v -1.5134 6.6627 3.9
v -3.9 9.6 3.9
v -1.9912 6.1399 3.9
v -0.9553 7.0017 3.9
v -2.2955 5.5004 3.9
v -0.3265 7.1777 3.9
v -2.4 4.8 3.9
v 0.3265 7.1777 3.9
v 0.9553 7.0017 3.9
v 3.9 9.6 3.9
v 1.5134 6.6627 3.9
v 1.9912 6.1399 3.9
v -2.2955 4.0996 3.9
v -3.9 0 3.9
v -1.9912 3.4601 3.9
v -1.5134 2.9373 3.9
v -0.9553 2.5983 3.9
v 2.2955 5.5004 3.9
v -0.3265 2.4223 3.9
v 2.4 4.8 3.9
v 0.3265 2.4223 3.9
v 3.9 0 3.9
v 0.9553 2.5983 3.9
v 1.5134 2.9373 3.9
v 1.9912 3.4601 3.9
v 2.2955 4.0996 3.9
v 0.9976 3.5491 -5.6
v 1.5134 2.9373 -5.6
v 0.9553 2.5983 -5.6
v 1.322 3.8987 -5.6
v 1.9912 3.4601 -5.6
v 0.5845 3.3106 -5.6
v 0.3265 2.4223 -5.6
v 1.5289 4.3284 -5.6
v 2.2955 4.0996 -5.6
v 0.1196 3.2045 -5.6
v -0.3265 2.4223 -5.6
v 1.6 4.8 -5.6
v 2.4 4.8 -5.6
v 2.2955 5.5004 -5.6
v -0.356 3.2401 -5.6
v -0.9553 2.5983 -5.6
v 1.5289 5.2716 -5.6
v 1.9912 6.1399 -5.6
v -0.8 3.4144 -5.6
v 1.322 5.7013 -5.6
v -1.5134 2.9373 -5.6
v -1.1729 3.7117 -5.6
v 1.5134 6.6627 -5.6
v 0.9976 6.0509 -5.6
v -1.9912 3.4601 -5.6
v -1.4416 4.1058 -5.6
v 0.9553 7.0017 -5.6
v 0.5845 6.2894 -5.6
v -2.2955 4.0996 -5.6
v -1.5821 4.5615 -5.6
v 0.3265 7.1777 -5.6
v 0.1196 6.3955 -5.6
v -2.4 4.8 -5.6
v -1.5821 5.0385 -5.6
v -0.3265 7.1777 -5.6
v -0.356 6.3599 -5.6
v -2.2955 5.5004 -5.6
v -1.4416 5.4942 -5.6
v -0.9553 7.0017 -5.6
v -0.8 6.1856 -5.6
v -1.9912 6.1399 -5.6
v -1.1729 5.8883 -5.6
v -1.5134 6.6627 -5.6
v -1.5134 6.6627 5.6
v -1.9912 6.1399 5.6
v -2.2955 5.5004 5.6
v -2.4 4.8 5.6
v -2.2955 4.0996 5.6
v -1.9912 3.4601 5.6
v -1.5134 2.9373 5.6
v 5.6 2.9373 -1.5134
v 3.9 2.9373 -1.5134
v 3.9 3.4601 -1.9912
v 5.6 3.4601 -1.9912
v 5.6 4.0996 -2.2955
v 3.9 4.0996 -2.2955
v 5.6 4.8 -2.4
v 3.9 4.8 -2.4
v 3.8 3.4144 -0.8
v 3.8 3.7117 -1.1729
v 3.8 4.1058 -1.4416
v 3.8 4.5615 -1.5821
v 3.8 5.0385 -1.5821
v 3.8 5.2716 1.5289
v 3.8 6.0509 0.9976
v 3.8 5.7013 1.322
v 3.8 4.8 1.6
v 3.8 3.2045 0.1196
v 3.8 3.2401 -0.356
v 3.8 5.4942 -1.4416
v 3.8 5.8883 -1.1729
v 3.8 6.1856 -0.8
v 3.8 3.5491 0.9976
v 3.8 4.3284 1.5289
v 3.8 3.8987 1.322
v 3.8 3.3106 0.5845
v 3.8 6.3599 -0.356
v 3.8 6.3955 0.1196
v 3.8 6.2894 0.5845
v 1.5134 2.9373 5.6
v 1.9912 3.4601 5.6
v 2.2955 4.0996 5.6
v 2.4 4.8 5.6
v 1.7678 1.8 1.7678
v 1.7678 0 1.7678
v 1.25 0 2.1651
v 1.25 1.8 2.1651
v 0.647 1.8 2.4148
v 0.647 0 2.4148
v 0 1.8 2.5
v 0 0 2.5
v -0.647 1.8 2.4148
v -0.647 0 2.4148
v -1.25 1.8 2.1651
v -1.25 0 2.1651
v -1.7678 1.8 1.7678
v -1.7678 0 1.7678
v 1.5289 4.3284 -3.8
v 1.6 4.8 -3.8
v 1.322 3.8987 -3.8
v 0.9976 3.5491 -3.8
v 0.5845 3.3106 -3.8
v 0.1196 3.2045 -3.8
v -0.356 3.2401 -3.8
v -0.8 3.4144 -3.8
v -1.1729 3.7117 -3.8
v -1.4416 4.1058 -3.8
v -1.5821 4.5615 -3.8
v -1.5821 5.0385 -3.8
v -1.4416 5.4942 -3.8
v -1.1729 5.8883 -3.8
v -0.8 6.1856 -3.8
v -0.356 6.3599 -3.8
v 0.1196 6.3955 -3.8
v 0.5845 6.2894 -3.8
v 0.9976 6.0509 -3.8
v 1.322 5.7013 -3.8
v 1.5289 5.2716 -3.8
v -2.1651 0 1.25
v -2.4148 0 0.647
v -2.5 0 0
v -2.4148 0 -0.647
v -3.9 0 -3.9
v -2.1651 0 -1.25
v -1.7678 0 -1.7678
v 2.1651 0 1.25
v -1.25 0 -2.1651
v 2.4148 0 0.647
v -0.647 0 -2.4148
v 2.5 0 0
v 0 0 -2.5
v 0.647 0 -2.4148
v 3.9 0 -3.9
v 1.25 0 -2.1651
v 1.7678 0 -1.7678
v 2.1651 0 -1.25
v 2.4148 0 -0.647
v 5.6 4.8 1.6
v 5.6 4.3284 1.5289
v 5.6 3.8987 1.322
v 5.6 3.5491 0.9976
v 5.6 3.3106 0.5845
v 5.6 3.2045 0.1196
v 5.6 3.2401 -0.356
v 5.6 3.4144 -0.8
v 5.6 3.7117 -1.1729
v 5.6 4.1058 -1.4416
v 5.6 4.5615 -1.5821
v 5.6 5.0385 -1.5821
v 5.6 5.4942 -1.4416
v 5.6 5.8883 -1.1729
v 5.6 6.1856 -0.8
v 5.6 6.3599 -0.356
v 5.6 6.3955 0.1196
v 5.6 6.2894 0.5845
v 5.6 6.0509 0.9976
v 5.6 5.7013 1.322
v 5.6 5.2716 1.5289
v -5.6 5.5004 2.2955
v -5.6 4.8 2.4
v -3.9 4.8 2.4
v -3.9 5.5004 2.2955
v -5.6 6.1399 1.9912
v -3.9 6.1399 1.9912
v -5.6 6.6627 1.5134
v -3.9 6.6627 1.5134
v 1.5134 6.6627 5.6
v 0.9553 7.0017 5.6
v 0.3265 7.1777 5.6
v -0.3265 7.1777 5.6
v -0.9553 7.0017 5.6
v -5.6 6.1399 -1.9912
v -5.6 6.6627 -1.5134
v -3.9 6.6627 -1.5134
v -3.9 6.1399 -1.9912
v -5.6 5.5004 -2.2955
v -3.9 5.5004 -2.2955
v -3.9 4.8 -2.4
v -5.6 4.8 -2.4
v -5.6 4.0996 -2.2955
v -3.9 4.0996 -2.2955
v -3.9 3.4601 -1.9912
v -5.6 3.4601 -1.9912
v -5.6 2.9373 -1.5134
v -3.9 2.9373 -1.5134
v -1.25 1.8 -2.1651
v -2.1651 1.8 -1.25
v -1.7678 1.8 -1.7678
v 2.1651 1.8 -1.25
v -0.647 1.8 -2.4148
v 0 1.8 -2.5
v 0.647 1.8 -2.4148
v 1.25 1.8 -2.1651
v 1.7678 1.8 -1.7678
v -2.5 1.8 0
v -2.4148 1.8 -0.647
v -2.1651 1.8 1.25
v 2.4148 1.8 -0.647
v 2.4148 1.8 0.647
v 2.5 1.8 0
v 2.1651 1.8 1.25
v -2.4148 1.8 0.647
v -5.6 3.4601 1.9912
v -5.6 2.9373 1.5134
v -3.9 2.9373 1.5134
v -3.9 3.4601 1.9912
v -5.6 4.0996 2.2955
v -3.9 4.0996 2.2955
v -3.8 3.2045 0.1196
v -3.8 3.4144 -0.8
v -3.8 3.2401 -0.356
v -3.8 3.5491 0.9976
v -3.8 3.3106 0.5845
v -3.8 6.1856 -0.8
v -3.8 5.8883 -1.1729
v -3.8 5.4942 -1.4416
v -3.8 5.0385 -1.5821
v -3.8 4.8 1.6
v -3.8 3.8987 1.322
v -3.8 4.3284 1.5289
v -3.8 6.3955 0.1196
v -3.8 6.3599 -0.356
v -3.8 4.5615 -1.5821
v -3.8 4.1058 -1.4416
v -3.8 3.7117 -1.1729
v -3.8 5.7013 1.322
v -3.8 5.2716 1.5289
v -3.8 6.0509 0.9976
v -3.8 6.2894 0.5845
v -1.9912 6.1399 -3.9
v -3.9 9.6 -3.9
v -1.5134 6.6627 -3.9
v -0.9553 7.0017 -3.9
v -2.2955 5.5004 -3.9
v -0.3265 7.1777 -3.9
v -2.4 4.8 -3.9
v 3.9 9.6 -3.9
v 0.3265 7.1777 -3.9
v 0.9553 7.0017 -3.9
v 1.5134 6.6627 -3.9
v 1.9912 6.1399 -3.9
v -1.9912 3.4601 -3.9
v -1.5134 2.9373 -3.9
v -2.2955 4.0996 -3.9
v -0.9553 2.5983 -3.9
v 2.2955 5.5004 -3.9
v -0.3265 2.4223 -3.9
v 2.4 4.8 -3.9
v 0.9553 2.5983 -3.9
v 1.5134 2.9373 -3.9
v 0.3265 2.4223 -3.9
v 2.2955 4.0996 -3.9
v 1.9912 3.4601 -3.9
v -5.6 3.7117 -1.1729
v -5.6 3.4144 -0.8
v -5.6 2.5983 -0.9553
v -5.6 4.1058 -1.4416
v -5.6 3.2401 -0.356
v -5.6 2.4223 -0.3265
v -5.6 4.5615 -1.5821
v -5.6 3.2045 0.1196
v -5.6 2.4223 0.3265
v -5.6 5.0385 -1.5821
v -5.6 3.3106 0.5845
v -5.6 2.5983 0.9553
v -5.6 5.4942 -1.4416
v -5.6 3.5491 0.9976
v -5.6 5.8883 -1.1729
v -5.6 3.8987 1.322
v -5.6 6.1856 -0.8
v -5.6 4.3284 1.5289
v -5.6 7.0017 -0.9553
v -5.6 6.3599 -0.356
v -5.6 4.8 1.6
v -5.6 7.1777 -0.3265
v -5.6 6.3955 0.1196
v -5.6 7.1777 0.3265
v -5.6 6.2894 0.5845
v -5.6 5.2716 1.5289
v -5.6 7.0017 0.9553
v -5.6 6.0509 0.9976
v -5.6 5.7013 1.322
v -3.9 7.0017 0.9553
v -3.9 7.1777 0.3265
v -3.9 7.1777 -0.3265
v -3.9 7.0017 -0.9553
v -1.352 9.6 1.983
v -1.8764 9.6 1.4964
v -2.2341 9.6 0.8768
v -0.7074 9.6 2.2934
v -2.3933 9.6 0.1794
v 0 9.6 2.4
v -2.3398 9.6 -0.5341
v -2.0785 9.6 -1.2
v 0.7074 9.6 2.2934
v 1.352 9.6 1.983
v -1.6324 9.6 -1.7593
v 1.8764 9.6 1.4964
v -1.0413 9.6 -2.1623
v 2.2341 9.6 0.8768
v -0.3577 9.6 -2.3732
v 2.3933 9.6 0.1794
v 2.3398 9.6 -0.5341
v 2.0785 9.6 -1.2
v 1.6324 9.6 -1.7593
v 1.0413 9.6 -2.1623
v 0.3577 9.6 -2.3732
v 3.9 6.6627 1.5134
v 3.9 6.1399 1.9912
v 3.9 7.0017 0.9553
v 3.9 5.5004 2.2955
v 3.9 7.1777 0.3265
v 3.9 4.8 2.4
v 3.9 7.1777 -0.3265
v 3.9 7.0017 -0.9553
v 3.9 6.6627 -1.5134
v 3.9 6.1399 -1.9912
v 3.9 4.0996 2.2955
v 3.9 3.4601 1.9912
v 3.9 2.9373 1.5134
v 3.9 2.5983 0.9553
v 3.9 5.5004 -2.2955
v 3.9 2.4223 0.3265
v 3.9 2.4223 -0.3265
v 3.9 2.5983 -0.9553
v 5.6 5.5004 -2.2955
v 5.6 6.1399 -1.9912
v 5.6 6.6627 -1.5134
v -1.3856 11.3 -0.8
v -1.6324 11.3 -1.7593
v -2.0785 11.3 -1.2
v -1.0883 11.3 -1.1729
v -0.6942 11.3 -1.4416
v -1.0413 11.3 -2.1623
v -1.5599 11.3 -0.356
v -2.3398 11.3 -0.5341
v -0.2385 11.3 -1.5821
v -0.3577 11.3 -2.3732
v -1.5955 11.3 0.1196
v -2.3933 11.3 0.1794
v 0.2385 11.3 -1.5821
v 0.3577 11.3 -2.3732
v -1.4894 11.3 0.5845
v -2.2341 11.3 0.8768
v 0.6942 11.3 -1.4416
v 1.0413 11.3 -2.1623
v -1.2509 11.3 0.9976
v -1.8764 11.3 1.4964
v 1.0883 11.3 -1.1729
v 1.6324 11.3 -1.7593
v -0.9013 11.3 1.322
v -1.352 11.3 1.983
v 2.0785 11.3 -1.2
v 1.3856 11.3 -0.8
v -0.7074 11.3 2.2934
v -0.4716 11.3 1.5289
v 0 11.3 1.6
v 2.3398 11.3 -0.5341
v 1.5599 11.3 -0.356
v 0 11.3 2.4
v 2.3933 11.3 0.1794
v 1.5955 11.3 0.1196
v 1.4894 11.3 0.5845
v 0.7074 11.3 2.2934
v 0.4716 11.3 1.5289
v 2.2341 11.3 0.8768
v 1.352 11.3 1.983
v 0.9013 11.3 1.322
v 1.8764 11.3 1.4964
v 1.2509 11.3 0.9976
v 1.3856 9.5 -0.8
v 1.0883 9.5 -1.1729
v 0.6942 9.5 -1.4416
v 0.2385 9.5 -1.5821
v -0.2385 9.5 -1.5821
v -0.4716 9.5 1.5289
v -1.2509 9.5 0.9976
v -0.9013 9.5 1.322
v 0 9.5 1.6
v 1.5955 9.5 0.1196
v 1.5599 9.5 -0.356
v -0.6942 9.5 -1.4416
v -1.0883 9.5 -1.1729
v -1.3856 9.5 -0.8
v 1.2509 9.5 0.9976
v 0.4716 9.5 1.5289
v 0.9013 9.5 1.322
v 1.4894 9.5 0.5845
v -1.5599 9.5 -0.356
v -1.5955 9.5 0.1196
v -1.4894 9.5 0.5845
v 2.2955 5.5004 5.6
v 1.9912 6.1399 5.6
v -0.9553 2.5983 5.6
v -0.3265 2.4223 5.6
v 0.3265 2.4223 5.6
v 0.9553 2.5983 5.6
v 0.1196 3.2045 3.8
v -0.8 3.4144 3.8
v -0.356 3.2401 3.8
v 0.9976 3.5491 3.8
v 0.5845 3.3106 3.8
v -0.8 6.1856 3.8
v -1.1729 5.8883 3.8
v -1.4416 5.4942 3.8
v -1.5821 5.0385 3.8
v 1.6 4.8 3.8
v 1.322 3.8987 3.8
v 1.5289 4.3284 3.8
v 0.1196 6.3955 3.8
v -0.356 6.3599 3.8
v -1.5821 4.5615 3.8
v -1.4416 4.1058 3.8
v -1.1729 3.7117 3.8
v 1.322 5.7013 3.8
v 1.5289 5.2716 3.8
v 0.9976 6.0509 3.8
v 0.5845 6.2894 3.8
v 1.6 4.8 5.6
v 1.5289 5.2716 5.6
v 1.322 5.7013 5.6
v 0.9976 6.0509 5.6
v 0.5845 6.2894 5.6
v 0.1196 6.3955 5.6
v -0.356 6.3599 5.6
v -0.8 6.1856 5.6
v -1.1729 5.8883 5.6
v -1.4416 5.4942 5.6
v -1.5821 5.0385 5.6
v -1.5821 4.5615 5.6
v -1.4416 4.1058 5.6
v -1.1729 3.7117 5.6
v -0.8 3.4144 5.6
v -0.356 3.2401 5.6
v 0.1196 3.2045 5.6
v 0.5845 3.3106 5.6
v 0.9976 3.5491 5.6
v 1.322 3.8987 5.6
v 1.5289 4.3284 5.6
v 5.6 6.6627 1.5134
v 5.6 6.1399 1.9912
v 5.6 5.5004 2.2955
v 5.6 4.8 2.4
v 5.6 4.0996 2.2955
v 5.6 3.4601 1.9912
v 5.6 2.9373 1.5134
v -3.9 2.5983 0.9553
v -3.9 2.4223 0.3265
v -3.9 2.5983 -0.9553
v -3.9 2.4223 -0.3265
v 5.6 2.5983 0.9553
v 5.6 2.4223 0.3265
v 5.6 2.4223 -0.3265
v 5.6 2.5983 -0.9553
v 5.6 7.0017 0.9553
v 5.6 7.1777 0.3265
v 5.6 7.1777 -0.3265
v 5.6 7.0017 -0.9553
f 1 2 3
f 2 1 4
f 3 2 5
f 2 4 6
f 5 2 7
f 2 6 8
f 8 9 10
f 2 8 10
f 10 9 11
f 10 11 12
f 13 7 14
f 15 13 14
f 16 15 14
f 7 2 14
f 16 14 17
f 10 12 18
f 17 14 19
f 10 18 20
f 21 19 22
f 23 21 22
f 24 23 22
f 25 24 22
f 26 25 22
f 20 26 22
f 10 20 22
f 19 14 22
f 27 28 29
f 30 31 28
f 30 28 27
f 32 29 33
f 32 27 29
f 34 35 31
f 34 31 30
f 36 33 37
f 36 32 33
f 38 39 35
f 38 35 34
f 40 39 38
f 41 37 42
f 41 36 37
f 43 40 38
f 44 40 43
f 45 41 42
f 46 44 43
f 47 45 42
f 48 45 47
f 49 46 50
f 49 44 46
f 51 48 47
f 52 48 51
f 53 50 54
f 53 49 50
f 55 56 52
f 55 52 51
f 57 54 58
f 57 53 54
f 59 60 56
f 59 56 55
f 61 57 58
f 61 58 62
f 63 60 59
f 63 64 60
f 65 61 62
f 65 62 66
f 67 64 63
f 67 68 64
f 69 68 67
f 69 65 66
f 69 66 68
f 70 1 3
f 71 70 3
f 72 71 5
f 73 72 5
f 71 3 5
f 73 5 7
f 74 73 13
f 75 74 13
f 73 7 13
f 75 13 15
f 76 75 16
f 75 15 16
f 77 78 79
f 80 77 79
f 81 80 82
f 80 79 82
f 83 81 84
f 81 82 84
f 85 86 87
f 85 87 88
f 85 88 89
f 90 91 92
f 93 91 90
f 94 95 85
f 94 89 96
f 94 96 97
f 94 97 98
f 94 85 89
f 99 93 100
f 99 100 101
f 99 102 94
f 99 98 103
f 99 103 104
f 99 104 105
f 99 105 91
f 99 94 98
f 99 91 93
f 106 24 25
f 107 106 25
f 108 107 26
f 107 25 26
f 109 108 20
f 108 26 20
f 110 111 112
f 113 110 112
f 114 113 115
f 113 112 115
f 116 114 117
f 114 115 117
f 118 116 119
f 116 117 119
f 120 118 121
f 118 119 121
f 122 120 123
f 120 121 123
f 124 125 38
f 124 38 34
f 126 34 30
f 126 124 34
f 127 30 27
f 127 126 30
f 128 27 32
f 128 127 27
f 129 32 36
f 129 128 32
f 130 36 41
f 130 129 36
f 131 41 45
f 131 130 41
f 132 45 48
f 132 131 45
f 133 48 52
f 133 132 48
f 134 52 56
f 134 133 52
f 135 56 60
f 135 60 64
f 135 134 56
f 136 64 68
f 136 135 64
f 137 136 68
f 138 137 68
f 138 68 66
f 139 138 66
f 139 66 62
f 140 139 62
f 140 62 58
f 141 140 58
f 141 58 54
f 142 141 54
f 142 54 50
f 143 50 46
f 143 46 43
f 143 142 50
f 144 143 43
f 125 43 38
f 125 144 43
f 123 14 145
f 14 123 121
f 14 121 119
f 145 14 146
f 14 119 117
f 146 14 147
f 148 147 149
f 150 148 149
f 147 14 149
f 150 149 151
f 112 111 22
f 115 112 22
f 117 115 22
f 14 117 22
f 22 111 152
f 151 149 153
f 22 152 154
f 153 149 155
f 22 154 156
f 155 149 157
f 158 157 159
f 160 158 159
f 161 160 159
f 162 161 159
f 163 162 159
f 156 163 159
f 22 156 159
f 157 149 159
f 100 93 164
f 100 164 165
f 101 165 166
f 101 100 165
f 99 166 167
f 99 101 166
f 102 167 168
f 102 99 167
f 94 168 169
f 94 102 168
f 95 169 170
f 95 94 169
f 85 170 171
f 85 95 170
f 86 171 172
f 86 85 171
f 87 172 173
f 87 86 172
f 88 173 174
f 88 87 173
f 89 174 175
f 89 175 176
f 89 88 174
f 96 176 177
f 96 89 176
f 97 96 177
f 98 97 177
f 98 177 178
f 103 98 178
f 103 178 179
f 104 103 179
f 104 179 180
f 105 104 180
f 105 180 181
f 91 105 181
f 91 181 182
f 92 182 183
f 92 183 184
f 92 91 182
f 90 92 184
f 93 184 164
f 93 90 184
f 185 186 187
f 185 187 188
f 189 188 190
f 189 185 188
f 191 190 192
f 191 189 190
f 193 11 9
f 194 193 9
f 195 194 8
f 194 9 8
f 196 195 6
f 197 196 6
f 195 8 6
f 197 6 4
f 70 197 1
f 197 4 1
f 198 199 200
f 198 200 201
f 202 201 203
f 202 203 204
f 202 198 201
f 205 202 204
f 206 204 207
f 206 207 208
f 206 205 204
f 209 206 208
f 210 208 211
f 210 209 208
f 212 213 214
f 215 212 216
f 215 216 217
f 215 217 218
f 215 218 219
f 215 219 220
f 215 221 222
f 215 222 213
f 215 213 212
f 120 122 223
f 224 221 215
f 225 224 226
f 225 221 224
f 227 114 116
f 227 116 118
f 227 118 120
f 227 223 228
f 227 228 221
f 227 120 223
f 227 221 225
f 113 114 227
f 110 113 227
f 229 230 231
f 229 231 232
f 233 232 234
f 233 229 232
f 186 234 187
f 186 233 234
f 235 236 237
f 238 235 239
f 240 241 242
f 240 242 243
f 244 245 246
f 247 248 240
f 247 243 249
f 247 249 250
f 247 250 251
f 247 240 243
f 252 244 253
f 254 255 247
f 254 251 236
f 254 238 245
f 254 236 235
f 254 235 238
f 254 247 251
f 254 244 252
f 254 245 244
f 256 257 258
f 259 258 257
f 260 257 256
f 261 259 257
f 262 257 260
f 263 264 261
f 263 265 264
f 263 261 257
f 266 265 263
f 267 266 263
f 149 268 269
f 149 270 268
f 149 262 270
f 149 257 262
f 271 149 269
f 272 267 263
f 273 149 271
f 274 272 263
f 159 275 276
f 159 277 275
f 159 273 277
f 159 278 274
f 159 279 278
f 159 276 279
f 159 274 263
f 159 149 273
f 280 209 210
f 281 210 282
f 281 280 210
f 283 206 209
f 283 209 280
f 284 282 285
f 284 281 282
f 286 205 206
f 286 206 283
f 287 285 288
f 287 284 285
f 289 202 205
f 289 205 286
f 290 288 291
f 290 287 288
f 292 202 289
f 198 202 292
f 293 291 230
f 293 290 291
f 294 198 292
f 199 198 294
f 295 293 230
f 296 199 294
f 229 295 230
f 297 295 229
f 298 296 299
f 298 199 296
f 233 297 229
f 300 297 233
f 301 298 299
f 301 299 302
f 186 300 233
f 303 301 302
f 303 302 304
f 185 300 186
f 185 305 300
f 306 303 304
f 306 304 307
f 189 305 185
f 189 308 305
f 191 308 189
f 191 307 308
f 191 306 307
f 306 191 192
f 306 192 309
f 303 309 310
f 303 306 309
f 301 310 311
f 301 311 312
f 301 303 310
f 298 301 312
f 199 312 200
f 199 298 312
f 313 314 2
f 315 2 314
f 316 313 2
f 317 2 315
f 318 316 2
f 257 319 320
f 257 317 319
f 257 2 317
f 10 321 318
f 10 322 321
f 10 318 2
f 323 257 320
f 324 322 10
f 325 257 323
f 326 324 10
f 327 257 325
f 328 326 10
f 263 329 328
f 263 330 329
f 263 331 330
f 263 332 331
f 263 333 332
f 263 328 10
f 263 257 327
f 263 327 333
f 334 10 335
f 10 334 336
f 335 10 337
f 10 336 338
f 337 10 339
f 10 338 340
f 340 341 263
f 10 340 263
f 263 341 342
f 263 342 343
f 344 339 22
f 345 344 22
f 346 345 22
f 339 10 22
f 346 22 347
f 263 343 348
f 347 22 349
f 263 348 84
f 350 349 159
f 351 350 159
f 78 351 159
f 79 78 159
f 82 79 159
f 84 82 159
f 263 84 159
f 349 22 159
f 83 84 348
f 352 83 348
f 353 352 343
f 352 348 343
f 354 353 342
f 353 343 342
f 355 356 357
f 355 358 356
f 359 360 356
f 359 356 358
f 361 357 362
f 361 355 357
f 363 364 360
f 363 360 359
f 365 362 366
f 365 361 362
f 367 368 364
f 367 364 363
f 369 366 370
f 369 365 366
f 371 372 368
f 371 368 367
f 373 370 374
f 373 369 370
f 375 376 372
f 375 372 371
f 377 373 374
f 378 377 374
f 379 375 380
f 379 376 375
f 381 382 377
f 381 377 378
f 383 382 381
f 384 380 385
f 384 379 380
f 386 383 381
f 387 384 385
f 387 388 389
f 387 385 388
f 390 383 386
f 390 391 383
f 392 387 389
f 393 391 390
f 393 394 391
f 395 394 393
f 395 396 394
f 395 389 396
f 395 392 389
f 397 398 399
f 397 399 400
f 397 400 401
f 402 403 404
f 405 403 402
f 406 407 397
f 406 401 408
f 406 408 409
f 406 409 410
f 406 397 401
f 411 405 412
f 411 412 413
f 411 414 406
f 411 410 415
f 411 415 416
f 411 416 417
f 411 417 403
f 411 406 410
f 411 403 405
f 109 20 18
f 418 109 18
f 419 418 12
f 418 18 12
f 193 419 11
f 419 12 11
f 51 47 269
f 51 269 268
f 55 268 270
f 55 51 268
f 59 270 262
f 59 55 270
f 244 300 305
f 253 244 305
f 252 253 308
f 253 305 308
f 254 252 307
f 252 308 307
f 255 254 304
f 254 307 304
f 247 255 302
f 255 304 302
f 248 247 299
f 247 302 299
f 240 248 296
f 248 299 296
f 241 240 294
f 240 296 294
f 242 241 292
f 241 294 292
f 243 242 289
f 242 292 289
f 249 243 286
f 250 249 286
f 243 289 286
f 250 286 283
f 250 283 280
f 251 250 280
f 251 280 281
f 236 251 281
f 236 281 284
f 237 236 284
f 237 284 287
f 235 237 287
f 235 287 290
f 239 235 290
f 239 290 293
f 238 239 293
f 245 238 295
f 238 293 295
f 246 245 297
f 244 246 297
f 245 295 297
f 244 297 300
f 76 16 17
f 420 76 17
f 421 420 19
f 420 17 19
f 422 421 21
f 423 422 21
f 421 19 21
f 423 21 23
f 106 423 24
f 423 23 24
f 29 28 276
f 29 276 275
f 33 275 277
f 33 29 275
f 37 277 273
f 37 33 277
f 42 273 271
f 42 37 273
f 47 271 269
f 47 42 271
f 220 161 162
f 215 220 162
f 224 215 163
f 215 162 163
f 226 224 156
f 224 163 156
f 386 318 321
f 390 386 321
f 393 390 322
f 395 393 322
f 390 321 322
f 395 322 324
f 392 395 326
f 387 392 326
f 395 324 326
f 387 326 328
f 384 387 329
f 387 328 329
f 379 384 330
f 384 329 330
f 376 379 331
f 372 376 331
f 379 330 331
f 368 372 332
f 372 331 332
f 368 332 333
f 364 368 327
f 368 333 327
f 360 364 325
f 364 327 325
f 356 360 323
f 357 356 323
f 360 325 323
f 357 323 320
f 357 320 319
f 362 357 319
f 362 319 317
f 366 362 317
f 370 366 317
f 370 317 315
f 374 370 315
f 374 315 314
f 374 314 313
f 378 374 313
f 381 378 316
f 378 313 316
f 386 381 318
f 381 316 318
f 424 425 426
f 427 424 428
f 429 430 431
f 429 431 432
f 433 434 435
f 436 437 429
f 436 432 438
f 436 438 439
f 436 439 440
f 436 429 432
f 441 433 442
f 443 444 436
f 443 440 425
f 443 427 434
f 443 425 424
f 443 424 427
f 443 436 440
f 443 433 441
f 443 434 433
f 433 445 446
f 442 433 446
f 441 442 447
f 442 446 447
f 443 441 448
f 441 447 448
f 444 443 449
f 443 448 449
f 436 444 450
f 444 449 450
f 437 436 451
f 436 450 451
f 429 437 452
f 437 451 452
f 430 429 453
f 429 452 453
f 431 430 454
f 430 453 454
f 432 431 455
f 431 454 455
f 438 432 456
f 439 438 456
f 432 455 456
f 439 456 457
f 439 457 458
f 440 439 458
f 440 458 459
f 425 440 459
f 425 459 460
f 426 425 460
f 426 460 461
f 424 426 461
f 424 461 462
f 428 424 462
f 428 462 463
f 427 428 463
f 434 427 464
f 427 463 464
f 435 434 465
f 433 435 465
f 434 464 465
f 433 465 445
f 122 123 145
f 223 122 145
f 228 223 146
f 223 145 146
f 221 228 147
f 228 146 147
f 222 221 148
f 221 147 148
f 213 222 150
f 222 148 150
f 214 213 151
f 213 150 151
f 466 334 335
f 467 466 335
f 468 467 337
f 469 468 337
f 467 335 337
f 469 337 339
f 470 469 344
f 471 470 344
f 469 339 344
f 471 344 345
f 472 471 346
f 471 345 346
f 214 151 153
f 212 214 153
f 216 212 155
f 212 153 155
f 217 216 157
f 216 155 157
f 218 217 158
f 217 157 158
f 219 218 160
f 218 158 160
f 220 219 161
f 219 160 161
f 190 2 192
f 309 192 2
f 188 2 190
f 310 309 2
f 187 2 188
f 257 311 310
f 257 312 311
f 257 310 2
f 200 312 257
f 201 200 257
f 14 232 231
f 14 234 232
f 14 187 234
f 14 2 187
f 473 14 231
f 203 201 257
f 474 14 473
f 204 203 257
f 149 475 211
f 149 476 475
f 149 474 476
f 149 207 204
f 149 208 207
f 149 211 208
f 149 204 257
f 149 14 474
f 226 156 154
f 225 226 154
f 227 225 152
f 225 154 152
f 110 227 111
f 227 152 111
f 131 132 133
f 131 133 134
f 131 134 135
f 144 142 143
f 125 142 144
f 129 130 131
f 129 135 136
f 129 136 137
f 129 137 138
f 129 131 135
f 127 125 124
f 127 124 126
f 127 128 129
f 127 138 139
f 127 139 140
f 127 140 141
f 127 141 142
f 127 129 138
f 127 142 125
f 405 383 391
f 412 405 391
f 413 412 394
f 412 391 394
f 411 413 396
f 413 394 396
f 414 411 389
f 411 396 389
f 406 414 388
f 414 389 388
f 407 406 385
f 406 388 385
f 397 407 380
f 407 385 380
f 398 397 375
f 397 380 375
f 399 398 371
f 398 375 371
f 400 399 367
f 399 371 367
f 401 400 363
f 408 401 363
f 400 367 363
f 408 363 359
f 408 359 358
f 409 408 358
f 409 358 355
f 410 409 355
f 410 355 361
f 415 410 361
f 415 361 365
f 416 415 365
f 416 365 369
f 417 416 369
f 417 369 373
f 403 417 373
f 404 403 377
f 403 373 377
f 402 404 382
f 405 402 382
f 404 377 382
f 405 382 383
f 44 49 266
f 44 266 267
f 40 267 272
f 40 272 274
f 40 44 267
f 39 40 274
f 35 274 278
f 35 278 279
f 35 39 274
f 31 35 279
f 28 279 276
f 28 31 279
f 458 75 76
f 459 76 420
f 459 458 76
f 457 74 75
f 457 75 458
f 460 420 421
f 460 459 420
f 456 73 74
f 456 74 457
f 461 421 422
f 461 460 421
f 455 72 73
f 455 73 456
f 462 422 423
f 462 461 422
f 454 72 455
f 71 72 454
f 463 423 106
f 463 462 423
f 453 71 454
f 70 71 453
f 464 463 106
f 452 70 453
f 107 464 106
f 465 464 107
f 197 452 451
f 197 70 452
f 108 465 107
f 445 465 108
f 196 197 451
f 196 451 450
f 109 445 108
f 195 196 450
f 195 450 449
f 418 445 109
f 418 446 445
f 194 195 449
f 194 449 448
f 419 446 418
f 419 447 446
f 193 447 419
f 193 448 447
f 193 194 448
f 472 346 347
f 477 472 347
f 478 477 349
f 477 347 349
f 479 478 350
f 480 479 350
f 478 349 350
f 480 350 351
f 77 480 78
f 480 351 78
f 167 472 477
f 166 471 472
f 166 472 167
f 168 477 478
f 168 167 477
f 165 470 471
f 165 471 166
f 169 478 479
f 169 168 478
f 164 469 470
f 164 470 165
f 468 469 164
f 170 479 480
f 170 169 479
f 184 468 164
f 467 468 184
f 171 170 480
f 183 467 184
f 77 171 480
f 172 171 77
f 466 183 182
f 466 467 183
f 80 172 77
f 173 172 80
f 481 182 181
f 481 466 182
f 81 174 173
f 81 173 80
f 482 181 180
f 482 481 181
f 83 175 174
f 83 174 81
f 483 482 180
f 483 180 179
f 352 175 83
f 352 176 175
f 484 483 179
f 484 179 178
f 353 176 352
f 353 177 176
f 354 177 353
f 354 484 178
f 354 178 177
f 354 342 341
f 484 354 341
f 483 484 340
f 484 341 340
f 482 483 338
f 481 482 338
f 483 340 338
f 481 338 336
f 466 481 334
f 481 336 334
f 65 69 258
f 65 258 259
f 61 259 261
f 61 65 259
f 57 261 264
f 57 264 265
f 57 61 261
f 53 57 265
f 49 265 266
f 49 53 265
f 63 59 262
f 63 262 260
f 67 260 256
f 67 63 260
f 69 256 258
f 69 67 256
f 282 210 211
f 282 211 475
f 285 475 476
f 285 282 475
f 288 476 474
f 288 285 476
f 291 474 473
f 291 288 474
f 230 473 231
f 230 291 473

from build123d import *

# Parameters (mm, degrees)
SKETCH_1_W          = 7.8
SKETCH_1_H          = 7.8
EXTRUDE_1_DEPTH     = 9.6
SKETCH_2_R          = 2.4
EXTRUDE_2_DEPTH     = 1.7
EXTRUDE_6_DEPTH     = 1.7
EXTRUDE_7_DEPTH     = 1.7
EXTRUDE_START       = 1.7
EXTRUDE_8_DEPTH     = 1.7
EXTRUDE_9_DEPTH     = 1.7
CUT_EXTRUDE_1_DEPTH = 1.8
SKETCH_12_R         = 1.6
CUT_EXTRUDE_2_DEPTH = 1.8
SKETCH_13_R         = 1.6
CUT_EXTRUDE_3_DEPTH = 1.8
CUT_EXTRUDE_START   = -1.8
SKETCH_14_R         = 1.6
CUT_EXTRUDE_4_DEPTH = 1.8
SKETCH_15_R         = 1.6
CUT_EXTRUDE_5_DEPTH = 1.8
SKETCH_16_R         = 1.6
CUT_EXTRUDE_6_DEPTH = 1.8


with BuildPart() as part:
    # Эскиз1 → Бобышка-Вытянуть1 (new body)
    with BuildSketch(Plane(origin=(0, 0, 0), x_dir=(1, 0, 0), z_dir=(0, 1, 0))):
        Rectangle(SKETCH_1_W, SKETCH_1_H)
    extrude(amount=EXTRUDE_1_DEPTH)

    # Эскиз2 → Бобышка-Вытянуть2 (add)
    with BuildSketch(Plane(origin=(0, 9.6, 0), x_dir=(1, 0, 0), z_dir=(0, 1, 0))):
        with Locations(Location((0, 0, 0), (0, 0, 270))):
            Circle(SKETCH_2_R)
    extrude(amount=EXTRUDE_2_DEPTH)

    # Эскиз6 → Бобышка-Вытянуть6 (add)
    with BuildSketch(Plane.XY.offset(3.9)):
        with BuildLine():
            ThreePointArc((1.5134223, 6.6626736), (0, 7.2), (-1.5134223, 6.6626736))
            Line((-1.5134223, 6.6626736), (0, 4.8))
            Line((0, 4.8), (1.5134223, 6.6626736))
        make_face()
        with BuildLine():
            Line((0, 4.8), (-1.5134223, 6.6626736))
            ThreePointArc((-1.5134223, 6.6626736), (-2.4, 4.8), (-1.5134223, 2.9373264))
            Line((-1.5134223, 2.9373264), (0, 4.8))
        make_face()
        with BuildLine():
            Line((1.5134223, 6.6626736), (0, 4.8))
            Line((0, 4.8), (1.5134223, 2.9373264))
            ThreePointArc((1.5134223, 2.9373264), (2.167050244, 3.768547994), (2.4, 4.8))
            ThreePointArc((2.4, 4.8), (2.167050244, 5.831452006), (1.5134223, 6.6626736))
        make_face()
        with BuildLine():
            Line((1.5134223, 2.9373264), (0, 4.8))
            Line((0, 4.8), (-1.5134223, 2.9373264))
            ThreePointArc((-1.5134223, 2.9373264), (0, 2.4), (1.5134223, 2.9373264))
        make_face()
    extrude(amount=EXTRUDE_6_DEPTH)

    # Эскиз7 → Бобышка-Вытянуть7 (add)
    with BuildSketch(Plane(origin=(3.9, 0, 0), x_dir=(0, 0, -1), z_dir=(1, 0, 0))):
        with BuildLine():
            ThreePointArc((1.5134223, 6.6626736), (0, 7.2), (-1.5134223, 6.6626736))
            Line((-1.5134223, 6.6626736), (0, 4.8))
            Line((0, 4.8), (1.5134223, 6.6626736))
        make_face()
        with BuildLine():
            Line((0, 4.8), (-1.5134223, 6.6626736))
            ThreePointArc((-1.5134223, 6.6626736), (-2.4, 4.8), (-1.5134223, 2.9373264))
            Line((-1.5134223, 2.9373264), (0, 4.8))
        make_face()
        with BuildLine():
            Line((1.5134223, 6.6626736), (0, 4.8))
            Line((0, 4.8), (1.5134223, 2.9373264))
            ThreePointArc((1.5134223, 2.9373264), (2.167050244, 3.768547994), (2.4, 4.8))
            ThreePointArc((2.4, 4.8), (2.167050244, 5.831452006), (1.5134223, 6.6626736))
        make_face()
        with BuildLine():
            Line((1.5134223, 2.9373264), (0, 4.8))
            Line((0, 4.8), (-1.5134223, 2.9373264))
            ThreePointArc((-1.5134223, 2.9373264), (0, 2.4), (1.5134223, 2.9373264))
        make_face()
    extrude(amount=EXTRUDE_7_DEPTH)

    # Эскиз9 → Бобышка-Вытянуть8 (add)
    with BuildSketch(Plane(origin=(0, 0, -3.9), x_dir=(-1, 0, 0), z_dir=(0, 0, -1)).offset(EXTRUDE_START)):
        with BuildLine():
            ThreePointArc((1.5134223, 6.6626736), (0, 7.2), (-1.5134223, 6.6626736))
            Line((-1.5134223, 6.6626736), (0, 4.8))
            Line((0, 4.8), (1.5134223, 6.6626736))
        make_face()
        with BuildLine():
            Line((0, 4.8), (-1.5134223, 6.6626736))
            ThreePointArc((-1.5134223, 6.6626736), (-2.4, 4.8), (-1.5134223, 2.9373264))
            Line((-1.5134223, 2.9373264), (0, 4.8))
        make_face()
        with BuildLine():
            Line((1.5134223, 6.6626736), (0, 4.8))
            Line((0, 4.8), (1.5134223, 2.9373264))
            ThreePointArc((1.5134223, 2.9373264), (2.167050244, 3.768547994), (2.4, 4.8))
            ThreePointArc((2.4, 4.8), (2.167050244, 5.831452006), (1.5134223, 6.6626736))
        make_face()
        with BuildLine():
            Line((1.5134223, 2.9373264), (0, 4.8))
            Line((0, 4.8), (-1.5134223, 2.9373264))
            ThreePointArc((-1.5134223, 2.9373264), (0, 2.4), (1.5134223, 2.9373264))
        make_face()
    extrude(amount=-EXTRUDE_8_DEPTH)

    # Эскиз10 → Бобышка-Вытянуть9 (add)
    with BuildSketch(Plane.ZY.offset(3.9).offset(EXTRUDE_START)):
        with BuildLine():
            ThreePointArc((1.5134223, 6.6626736), (0, 7.2), (-1.5134223, 6.6626736))
            Line((-1.5134223, 6.6626736), (0, 4.8))
            Line((0, 4.8), (1.5134223, 6.6626736))
        make_face()
        with BuildLine():
            Line((0, 4.8), (-1.5134223, 6.6626736))
            ThreePointArc((-1.5134223, 6.6626736), (-2.4, 4.8), (-1.5134223, 2.9373264))
            Line((-1.5134223, 2.9373264), (0, 4.8))
        make_face()
        with BuildLine():
            Line((1.5134223, 6.6626736), (0, 4.8))
            Line((0, 4.8), (1.5134223, 2.9373264))
            ThreePointArc((1.5134223, 2.9373264), (2.167050244, 3.768547994), (2.4, 4.8))
            ThreePointArc((2.4, 4.8), (2.167050244, 5.831452006), (1.5134223, 6.6626736))
        make_face()
        with BuildLine():
            Line((1.5134223, 2.9373264), (0, 4.8))
            Line((0, 4.8), (-1.5134223, 2.9373264))
            ThreePointArc((-1.5134223, 2.9373264), (0, 2.4), (1.5134223, 2.9373264))
        make_face()
    extrude(amount=-EXTRUDE_9_DEPTH)

    # Эскиз11 → Вырез-Вытянуть1 (cut)
    with BuildSketch(Plane.XZ):
        with BuildLine():
            ThreePointArc((1.767766953, 1.767766953), (0, 2.5), (-1.767766953, 1.767766953))
            Line((-1.767766953, 1.767766953), (0, 0))
            Line((0, 0), (1.767766953, 1.767766953))
        make_face()
        with BuildLine():
            Line((0, 0), (-1.767766953, 1.767766953))
            ThreePointArc((-1.767766953, 1.767766953), (-2.5, 0), (-1.767766953, -1.767766953))
            Line((-1.767766953, -1.767766953), (0, 0))
        make_face()
        with BuildLine():
            Line((1.767766953, 1.767766953), (0, 0))
            Line((0, 0), (1.767766953, -1.767766953))
            ThreePointArc((1.767766953, -1.767766953), (2.309698831, -0.956708581), (2.5, 0))
            ThreePointArc((2.5, 0), (2.309698831, 0.956708581), (1.767766953, 1.767766953))
        make_face()
        with BuildLine():
            Line((1.767766953, -1.767766953), (0, 0))
            Line((0, 0), (-1.767766953, -1.767766953))
            ThreePointArc((-1.767766953, -1.767766953), (0, -2.5), (1.767766953, -1.767766953))
        make_face()
    extrude(amount=-CUT_EXTRUDE_1_DEPTH, mode=Mode.SUBTRACT)

    # Эскиз12 → Вырез-Вытянуть2 (cut)
    with BuildSketch(Plane.XY.offset(5.6)):
        with Locations((0, 4.8)):
            Circle(SKETCH_12_R)
    extrude(amount=-CUT_EXTRUDE_2_DEPTH, mode=Mode.SUBTRACT)

    # Эскиз13 → Вырез-Вытянуть3 (cut)
    with BuildSketch(Plane.ZY.offset(5.6)):
        with Locations((0, 4.8)):
            Circle(SKETCH_13_R)
    extrude(amount=-CUT_EXTRUDE_3_DEPTH, mode=Mode.SUBTRACT)

    # Эскиз14 → Вырез-Вытянуть4 (cut)
    with BuildSketch(Plane(origin=(0, 0, -5.6), x_dir=(-1, 0, 0), z_dir=(0, 0, -1)).offset(CUT_EXTRUDE_START)):
        with Locations(Location((0, 4.8, 0), (0, 0, 180))):
            Circle(SKETCH_14_R)
    extrude(amount=CUT_EXTRUDE_4_DEPTH, mode=Mode.SUBTRACT)

    # Эскиз15 → Вырез-Вытянуть5 (cut)
    with BuildSketch(Plane(origin=(5.6, 0, 0), x_dir=(0, 0, -1), z_dir=(1, 0, 0)).offset(CUT_EXTRUDE_START)):
        with Locations(Location((0, 4.8, 0), (0, 0, 180))):
            Circle(SKETCH_15_R)
    extrude(amount=CUT_EXTRUDE_5_DEPTH, mode=Mode.SUBTRACT)

    # Эскиз16 → Вырез-Вытянуть6 (cut)
    with BuildSketch(Plane(origin=(0, 11.3, 0), x_dir=(1, 0, 0), z_dir=(0, 1, 0))):
        with Locations(Location((0, 0, 0), (0, 0, 270))):
            Circle(SKETCH_16_R)
    extrude(amount=-CUT_EXTRUDE_6_DEPTH, mode=Mode.SUBTRACT)


solid = part.part
